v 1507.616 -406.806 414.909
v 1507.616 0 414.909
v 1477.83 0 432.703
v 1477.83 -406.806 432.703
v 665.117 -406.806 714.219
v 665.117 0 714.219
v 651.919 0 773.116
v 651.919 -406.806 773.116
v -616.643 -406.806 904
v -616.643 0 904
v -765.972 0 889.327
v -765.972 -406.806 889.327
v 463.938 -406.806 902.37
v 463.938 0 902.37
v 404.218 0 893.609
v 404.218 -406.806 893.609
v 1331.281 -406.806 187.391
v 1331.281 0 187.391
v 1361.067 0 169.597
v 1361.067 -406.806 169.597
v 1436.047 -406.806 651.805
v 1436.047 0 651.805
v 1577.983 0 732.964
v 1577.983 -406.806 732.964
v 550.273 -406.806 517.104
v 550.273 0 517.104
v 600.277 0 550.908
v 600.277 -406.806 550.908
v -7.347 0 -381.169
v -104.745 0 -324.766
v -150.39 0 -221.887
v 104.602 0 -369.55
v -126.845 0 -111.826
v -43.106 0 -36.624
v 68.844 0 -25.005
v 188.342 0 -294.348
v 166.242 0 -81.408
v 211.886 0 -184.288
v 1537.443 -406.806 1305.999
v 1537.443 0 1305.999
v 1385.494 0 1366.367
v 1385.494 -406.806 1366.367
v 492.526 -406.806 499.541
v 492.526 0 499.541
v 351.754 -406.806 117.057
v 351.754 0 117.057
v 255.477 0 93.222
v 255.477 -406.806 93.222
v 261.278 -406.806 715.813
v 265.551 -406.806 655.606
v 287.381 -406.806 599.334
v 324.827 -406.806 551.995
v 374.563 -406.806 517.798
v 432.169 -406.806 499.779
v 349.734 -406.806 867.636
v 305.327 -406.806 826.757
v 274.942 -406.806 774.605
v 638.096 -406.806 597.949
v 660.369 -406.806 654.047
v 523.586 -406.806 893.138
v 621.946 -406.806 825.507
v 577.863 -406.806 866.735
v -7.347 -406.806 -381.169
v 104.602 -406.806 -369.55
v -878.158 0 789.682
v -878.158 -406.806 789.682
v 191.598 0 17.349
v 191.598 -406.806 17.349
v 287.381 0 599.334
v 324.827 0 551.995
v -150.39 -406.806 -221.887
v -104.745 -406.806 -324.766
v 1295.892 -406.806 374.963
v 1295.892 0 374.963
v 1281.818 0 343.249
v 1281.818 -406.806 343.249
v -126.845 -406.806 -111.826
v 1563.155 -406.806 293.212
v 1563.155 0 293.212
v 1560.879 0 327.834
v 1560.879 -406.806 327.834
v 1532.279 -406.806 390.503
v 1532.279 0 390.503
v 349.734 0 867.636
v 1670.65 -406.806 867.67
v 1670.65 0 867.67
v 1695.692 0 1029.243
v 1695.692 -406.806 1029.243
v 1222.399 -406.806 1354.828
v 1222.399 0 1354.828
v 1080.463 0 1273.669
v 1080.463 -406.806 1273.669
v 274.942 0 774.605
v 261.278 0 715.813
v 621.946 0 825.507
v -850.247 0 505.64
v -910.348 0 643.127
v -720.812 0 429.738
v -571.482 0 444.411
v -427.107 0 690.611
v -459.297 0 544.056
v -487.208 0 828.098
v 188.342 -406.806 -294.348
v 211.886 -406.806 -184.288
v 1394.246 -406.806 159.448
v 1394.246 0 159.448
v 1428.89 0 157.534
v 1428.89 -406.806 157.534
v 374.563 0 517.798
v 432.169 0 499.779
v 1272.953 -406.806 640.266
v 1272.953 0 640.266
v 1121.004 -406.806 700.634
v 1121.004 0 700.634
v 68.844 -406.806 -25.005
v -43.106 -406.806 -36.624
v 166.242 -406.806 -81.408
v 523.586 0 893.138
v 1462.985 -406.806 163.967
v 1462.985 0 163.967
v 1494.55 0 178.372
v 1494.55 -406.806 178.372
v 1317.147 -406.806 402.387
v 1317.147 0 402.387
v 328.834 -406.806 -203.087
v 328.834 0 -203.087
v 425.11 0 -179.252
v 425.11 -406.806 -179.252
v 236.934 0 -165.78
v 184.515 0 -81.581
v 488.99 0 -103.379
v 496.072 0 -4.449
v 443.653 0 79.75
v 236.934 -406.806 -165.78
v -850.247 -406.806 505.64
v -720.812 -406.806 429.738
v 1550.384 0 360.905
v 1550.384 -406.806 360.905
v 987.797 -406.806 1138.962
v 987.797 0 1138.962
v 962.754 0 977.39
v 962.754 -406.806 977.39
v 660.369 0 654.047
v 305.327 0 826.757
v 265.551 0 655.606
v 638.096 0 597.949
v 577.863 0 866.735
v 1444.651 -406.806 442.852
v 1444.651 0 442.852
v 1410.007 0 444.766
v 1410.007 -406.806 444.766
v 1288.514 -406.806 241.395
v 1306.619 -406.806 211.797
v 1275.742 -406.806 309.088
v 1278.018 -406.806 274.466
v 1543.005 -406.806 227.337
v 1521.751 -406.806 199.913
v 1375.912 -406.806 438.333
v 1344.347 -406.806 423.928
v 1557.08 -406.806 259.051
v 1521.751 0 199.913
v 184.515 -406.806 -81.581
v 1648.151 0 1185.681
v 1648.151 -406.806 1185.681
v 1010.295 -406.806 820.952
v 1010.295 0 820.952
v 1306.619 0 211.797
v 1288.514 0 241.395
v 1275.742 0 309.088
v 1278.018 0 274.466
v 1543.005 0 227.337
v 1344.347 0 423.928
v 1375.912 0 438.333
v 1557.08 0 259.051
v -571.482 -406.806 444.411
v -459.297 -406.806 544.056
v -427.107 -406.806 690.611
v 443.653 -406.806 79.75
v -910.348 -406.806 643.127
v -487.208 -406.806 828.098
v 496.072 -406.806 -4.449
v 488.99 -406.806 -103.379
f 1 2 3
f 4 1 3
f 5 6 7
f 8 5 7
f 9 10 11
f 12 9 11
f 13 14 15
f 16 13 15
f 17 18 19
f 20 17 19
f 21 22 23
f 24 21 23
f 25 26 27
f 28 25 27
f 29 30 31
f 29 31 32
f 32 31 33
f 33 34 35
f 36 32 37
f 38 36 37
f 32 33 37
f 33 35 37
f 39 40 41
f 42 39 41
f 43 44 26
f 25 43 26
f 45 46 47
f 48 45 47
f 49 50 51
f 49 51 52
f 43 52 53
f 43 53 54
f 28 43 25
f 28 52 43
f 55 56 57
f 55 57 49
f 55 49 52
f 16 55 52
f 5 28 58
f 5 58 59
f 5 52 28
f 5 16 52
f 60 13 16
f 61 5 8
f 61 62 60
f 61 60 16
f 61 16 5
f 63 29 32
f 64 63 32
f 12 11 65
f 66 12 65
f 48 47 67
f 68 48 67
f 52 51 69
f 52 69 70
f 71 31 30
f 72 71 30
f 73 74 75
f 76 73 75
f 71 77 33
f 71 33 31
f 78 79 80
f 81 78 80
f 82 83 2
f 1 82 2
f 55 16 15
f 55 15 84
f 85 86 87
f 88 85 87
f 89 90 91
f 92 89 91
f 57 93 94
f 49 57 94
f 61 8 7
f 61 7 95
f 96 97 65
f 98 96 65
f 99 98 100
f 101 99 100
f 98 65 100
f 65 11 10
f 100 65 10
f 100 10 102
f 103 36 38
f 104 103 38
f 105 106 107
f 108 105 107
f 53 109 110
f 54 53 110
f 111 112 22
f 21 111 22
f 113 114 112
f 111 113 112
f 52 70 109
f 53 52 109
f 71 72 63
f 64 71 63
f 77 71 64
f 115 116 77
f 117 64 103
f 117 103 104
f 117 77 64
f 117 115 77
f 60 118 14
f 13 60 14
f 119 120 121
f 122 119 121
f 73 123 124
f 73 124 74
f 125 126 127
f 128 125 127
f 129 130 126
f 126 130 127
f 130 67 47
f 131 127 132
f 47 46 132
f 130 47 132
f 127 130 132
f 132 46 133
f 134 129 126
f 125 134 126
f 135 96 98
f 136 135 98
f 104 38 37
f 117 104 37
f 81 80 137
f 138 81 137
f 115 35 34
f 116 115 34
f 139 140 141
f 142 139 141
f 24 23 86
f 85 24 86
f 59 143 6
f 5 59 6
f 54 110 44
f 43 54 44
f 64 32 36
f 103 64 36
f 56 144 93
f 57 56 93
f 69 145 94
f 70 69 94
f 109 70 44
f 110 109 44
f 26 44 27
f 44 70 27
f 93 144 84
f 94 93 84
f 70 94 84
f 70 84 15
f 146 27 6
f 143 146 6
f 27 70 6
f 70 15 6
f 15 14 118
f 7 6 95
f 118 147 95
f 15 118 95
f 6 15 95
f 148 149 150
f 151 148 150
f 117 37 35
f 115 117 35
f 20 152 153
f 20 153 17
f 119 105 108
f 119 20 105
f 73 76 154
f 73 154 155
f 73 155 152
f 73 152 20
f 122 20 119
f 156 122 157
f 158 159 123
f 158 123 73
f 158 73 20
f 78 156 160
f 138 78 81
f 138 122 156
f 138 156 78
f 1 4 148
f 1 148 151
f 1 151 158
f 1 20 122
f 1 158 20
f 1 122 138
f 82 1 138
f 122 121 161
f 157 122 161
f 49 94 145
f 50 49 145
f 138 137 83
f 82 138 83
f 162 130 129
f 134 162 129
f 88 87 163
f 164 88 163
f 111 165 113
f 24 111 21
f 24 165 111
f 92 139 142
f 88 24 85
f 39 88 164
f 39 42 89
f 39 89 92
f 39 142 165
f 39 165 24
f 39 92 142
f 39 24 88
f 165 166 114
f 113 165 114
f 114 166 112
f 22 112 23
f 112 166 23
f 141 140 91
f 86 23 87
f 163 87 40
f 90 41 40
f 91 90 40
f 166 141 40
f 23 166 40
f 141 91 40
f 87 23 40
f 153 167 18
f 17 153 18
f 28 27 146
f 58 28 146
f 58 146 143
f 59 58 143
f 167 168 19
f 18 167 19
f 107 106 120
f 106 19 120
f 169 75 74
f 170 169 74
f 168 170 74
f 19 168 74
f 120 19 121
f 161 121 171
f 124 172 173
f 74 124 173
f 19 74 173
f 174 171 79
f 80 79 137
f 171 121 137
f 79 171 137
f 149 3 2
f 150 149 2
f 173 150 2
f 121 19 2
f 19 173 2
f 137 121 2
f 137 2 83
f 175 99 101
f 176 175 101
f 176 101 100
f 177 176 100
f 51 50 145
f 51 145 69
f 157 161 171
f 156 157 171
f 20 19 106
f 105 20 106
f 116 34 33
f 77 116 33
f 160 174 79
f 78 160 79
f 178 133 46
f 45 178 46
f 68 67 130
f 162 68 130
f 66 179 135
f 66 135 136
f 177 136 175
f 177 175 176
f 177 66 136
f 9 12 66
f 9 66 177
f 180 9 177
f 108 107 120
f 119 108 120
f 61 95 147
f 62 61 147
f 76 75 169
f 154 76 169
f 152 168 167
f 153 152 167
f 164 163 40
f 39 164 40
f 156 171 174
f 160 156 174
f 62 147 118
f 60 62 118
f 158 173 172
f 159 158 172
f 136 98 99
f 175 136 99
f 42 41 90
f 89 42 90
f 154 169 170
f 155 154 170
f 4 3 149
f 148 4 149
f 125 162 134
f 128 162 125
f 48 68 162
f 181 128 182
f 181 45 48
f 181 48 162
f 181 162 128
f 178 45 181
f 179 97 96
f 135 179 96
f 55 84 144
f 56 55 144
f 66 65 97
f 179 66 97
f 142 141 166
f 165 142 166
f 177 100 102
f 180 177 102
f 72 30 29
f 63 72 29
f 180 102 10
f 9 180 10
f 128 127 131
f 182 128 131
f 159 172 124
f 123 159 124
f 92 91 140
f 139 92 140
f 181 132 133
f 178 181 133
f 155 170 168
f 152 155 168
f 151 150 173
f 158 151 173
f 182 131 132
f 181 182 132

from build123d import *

# Parameters (mm, degrees)
F1_DEPTH = 406.8064


with BuildPart() as f1:
    # F0 (on Front) → F1 (new body)
    with BuildSketch(Plane.XZ):
        Polygon((328.833702, -203.087142), (425.11031, -179.252118), (488.989847, -103.379208), (496.0725, -4.449285), (443.652937, 79.749784), (351.753649, 117.056815), (255.477041, 93.221791), (191.597504, 17.348881), (184.514851, -81.581042), (236.934414, -165.780111), align=None)
        Polygon((104.602455, -369.550106), (188.34205, -294.34815), (211.886205, -184.287591), (166.241852, -81.407821), (68.843584, -25.005416), (-43.105772, -36.624177), (-126.845367, -111.826133), (-150.389522, -221.886693), (-104.74517, -324.766463), (-7.346902, -381.168868), align=None)
        Polygon((-427.107002, 690.611112), (-487.207711, 828.097582), (-616.642725, 904.000162), (-765.972269, 889.326647), (-878.157531, 789.68182), (-910.347556, 643.126619), (-850.246847, 505.640149), (-720.811832, 429.737569), (-571.482289, 444.411084), (-459.297026, 544.055911), align=None)
        Polygon((1121.003565, 700.634193), (1272.952676, 640.266061), (1436.046845, 651.804501), (1577.983272, 732.964184), (1670.649708, 867.67044), (1695.692427, 1029.243042), (1648.151413, 1185.680555), (1537.442746, 1305.998611), (1385.493636, 1366.366744), (1222.399467, 1354.828304), (1080.46304, 1273.668621), (987.796604, 1138.962365), (962.753885, 977.389763), (1010.294899, 820.95225), align=None)
        Polygon((660.369024, 654.047378), (665.117204, 714.218616), (651.918653, 773.116166), (621.946118, 825.506721), (577.862792, 866.735152), (523.585671, 893.13813), (463.937516, 902.369636), (404.218327, 893.609409), (349.734416, 867.635835), (305.326917, 826.75678), (274.941633, 774.604526), (261.278428, 715.81303), (265.551338, 655.606175), (287.380697, 599.333605), (324.826871, 551.995383), (374.562601, 517.797719), (432.168651, 499.779225), (492.52647, 499.540924), (550.273001, 517.103989), (600.277212, 550.907866), (638.096008, 597.94893), align=None)
        Polygon((1394.246264, 159.447986), (1428.890109, 157.534271), (1462.985248, 163.966981), (1494.550197, 178.372269), (1521.750514, 199.912951), (1543.005417, 227.337163), (1557.079648, 259.051108), (1563.155263, 293.211688), (1560.87917, 327.833612), (1550.383647, 360.904782), (1532.278656, 390.503221), (1507.616393, 414.908775), (1477.83014, 432.703083), (1444.650964, 442.852003), (1410.007119, 444.765717), (1375.91198, 438.333007), (1344.347031, 423.92772), (1317.146714, 402.387037), (1295.891811, 374.962825), (1281.81758, 343.24888), (1275.741965, 309.088301), (1278.018058, 274.466376), (1288.513581, 241.395206), (1306.618572, 211.796767), (1331.280835, 187.391213), (1361.067089, 169.596906), align=None)
    extrude(amount=F1_DEPTH)


solid = f1.part
